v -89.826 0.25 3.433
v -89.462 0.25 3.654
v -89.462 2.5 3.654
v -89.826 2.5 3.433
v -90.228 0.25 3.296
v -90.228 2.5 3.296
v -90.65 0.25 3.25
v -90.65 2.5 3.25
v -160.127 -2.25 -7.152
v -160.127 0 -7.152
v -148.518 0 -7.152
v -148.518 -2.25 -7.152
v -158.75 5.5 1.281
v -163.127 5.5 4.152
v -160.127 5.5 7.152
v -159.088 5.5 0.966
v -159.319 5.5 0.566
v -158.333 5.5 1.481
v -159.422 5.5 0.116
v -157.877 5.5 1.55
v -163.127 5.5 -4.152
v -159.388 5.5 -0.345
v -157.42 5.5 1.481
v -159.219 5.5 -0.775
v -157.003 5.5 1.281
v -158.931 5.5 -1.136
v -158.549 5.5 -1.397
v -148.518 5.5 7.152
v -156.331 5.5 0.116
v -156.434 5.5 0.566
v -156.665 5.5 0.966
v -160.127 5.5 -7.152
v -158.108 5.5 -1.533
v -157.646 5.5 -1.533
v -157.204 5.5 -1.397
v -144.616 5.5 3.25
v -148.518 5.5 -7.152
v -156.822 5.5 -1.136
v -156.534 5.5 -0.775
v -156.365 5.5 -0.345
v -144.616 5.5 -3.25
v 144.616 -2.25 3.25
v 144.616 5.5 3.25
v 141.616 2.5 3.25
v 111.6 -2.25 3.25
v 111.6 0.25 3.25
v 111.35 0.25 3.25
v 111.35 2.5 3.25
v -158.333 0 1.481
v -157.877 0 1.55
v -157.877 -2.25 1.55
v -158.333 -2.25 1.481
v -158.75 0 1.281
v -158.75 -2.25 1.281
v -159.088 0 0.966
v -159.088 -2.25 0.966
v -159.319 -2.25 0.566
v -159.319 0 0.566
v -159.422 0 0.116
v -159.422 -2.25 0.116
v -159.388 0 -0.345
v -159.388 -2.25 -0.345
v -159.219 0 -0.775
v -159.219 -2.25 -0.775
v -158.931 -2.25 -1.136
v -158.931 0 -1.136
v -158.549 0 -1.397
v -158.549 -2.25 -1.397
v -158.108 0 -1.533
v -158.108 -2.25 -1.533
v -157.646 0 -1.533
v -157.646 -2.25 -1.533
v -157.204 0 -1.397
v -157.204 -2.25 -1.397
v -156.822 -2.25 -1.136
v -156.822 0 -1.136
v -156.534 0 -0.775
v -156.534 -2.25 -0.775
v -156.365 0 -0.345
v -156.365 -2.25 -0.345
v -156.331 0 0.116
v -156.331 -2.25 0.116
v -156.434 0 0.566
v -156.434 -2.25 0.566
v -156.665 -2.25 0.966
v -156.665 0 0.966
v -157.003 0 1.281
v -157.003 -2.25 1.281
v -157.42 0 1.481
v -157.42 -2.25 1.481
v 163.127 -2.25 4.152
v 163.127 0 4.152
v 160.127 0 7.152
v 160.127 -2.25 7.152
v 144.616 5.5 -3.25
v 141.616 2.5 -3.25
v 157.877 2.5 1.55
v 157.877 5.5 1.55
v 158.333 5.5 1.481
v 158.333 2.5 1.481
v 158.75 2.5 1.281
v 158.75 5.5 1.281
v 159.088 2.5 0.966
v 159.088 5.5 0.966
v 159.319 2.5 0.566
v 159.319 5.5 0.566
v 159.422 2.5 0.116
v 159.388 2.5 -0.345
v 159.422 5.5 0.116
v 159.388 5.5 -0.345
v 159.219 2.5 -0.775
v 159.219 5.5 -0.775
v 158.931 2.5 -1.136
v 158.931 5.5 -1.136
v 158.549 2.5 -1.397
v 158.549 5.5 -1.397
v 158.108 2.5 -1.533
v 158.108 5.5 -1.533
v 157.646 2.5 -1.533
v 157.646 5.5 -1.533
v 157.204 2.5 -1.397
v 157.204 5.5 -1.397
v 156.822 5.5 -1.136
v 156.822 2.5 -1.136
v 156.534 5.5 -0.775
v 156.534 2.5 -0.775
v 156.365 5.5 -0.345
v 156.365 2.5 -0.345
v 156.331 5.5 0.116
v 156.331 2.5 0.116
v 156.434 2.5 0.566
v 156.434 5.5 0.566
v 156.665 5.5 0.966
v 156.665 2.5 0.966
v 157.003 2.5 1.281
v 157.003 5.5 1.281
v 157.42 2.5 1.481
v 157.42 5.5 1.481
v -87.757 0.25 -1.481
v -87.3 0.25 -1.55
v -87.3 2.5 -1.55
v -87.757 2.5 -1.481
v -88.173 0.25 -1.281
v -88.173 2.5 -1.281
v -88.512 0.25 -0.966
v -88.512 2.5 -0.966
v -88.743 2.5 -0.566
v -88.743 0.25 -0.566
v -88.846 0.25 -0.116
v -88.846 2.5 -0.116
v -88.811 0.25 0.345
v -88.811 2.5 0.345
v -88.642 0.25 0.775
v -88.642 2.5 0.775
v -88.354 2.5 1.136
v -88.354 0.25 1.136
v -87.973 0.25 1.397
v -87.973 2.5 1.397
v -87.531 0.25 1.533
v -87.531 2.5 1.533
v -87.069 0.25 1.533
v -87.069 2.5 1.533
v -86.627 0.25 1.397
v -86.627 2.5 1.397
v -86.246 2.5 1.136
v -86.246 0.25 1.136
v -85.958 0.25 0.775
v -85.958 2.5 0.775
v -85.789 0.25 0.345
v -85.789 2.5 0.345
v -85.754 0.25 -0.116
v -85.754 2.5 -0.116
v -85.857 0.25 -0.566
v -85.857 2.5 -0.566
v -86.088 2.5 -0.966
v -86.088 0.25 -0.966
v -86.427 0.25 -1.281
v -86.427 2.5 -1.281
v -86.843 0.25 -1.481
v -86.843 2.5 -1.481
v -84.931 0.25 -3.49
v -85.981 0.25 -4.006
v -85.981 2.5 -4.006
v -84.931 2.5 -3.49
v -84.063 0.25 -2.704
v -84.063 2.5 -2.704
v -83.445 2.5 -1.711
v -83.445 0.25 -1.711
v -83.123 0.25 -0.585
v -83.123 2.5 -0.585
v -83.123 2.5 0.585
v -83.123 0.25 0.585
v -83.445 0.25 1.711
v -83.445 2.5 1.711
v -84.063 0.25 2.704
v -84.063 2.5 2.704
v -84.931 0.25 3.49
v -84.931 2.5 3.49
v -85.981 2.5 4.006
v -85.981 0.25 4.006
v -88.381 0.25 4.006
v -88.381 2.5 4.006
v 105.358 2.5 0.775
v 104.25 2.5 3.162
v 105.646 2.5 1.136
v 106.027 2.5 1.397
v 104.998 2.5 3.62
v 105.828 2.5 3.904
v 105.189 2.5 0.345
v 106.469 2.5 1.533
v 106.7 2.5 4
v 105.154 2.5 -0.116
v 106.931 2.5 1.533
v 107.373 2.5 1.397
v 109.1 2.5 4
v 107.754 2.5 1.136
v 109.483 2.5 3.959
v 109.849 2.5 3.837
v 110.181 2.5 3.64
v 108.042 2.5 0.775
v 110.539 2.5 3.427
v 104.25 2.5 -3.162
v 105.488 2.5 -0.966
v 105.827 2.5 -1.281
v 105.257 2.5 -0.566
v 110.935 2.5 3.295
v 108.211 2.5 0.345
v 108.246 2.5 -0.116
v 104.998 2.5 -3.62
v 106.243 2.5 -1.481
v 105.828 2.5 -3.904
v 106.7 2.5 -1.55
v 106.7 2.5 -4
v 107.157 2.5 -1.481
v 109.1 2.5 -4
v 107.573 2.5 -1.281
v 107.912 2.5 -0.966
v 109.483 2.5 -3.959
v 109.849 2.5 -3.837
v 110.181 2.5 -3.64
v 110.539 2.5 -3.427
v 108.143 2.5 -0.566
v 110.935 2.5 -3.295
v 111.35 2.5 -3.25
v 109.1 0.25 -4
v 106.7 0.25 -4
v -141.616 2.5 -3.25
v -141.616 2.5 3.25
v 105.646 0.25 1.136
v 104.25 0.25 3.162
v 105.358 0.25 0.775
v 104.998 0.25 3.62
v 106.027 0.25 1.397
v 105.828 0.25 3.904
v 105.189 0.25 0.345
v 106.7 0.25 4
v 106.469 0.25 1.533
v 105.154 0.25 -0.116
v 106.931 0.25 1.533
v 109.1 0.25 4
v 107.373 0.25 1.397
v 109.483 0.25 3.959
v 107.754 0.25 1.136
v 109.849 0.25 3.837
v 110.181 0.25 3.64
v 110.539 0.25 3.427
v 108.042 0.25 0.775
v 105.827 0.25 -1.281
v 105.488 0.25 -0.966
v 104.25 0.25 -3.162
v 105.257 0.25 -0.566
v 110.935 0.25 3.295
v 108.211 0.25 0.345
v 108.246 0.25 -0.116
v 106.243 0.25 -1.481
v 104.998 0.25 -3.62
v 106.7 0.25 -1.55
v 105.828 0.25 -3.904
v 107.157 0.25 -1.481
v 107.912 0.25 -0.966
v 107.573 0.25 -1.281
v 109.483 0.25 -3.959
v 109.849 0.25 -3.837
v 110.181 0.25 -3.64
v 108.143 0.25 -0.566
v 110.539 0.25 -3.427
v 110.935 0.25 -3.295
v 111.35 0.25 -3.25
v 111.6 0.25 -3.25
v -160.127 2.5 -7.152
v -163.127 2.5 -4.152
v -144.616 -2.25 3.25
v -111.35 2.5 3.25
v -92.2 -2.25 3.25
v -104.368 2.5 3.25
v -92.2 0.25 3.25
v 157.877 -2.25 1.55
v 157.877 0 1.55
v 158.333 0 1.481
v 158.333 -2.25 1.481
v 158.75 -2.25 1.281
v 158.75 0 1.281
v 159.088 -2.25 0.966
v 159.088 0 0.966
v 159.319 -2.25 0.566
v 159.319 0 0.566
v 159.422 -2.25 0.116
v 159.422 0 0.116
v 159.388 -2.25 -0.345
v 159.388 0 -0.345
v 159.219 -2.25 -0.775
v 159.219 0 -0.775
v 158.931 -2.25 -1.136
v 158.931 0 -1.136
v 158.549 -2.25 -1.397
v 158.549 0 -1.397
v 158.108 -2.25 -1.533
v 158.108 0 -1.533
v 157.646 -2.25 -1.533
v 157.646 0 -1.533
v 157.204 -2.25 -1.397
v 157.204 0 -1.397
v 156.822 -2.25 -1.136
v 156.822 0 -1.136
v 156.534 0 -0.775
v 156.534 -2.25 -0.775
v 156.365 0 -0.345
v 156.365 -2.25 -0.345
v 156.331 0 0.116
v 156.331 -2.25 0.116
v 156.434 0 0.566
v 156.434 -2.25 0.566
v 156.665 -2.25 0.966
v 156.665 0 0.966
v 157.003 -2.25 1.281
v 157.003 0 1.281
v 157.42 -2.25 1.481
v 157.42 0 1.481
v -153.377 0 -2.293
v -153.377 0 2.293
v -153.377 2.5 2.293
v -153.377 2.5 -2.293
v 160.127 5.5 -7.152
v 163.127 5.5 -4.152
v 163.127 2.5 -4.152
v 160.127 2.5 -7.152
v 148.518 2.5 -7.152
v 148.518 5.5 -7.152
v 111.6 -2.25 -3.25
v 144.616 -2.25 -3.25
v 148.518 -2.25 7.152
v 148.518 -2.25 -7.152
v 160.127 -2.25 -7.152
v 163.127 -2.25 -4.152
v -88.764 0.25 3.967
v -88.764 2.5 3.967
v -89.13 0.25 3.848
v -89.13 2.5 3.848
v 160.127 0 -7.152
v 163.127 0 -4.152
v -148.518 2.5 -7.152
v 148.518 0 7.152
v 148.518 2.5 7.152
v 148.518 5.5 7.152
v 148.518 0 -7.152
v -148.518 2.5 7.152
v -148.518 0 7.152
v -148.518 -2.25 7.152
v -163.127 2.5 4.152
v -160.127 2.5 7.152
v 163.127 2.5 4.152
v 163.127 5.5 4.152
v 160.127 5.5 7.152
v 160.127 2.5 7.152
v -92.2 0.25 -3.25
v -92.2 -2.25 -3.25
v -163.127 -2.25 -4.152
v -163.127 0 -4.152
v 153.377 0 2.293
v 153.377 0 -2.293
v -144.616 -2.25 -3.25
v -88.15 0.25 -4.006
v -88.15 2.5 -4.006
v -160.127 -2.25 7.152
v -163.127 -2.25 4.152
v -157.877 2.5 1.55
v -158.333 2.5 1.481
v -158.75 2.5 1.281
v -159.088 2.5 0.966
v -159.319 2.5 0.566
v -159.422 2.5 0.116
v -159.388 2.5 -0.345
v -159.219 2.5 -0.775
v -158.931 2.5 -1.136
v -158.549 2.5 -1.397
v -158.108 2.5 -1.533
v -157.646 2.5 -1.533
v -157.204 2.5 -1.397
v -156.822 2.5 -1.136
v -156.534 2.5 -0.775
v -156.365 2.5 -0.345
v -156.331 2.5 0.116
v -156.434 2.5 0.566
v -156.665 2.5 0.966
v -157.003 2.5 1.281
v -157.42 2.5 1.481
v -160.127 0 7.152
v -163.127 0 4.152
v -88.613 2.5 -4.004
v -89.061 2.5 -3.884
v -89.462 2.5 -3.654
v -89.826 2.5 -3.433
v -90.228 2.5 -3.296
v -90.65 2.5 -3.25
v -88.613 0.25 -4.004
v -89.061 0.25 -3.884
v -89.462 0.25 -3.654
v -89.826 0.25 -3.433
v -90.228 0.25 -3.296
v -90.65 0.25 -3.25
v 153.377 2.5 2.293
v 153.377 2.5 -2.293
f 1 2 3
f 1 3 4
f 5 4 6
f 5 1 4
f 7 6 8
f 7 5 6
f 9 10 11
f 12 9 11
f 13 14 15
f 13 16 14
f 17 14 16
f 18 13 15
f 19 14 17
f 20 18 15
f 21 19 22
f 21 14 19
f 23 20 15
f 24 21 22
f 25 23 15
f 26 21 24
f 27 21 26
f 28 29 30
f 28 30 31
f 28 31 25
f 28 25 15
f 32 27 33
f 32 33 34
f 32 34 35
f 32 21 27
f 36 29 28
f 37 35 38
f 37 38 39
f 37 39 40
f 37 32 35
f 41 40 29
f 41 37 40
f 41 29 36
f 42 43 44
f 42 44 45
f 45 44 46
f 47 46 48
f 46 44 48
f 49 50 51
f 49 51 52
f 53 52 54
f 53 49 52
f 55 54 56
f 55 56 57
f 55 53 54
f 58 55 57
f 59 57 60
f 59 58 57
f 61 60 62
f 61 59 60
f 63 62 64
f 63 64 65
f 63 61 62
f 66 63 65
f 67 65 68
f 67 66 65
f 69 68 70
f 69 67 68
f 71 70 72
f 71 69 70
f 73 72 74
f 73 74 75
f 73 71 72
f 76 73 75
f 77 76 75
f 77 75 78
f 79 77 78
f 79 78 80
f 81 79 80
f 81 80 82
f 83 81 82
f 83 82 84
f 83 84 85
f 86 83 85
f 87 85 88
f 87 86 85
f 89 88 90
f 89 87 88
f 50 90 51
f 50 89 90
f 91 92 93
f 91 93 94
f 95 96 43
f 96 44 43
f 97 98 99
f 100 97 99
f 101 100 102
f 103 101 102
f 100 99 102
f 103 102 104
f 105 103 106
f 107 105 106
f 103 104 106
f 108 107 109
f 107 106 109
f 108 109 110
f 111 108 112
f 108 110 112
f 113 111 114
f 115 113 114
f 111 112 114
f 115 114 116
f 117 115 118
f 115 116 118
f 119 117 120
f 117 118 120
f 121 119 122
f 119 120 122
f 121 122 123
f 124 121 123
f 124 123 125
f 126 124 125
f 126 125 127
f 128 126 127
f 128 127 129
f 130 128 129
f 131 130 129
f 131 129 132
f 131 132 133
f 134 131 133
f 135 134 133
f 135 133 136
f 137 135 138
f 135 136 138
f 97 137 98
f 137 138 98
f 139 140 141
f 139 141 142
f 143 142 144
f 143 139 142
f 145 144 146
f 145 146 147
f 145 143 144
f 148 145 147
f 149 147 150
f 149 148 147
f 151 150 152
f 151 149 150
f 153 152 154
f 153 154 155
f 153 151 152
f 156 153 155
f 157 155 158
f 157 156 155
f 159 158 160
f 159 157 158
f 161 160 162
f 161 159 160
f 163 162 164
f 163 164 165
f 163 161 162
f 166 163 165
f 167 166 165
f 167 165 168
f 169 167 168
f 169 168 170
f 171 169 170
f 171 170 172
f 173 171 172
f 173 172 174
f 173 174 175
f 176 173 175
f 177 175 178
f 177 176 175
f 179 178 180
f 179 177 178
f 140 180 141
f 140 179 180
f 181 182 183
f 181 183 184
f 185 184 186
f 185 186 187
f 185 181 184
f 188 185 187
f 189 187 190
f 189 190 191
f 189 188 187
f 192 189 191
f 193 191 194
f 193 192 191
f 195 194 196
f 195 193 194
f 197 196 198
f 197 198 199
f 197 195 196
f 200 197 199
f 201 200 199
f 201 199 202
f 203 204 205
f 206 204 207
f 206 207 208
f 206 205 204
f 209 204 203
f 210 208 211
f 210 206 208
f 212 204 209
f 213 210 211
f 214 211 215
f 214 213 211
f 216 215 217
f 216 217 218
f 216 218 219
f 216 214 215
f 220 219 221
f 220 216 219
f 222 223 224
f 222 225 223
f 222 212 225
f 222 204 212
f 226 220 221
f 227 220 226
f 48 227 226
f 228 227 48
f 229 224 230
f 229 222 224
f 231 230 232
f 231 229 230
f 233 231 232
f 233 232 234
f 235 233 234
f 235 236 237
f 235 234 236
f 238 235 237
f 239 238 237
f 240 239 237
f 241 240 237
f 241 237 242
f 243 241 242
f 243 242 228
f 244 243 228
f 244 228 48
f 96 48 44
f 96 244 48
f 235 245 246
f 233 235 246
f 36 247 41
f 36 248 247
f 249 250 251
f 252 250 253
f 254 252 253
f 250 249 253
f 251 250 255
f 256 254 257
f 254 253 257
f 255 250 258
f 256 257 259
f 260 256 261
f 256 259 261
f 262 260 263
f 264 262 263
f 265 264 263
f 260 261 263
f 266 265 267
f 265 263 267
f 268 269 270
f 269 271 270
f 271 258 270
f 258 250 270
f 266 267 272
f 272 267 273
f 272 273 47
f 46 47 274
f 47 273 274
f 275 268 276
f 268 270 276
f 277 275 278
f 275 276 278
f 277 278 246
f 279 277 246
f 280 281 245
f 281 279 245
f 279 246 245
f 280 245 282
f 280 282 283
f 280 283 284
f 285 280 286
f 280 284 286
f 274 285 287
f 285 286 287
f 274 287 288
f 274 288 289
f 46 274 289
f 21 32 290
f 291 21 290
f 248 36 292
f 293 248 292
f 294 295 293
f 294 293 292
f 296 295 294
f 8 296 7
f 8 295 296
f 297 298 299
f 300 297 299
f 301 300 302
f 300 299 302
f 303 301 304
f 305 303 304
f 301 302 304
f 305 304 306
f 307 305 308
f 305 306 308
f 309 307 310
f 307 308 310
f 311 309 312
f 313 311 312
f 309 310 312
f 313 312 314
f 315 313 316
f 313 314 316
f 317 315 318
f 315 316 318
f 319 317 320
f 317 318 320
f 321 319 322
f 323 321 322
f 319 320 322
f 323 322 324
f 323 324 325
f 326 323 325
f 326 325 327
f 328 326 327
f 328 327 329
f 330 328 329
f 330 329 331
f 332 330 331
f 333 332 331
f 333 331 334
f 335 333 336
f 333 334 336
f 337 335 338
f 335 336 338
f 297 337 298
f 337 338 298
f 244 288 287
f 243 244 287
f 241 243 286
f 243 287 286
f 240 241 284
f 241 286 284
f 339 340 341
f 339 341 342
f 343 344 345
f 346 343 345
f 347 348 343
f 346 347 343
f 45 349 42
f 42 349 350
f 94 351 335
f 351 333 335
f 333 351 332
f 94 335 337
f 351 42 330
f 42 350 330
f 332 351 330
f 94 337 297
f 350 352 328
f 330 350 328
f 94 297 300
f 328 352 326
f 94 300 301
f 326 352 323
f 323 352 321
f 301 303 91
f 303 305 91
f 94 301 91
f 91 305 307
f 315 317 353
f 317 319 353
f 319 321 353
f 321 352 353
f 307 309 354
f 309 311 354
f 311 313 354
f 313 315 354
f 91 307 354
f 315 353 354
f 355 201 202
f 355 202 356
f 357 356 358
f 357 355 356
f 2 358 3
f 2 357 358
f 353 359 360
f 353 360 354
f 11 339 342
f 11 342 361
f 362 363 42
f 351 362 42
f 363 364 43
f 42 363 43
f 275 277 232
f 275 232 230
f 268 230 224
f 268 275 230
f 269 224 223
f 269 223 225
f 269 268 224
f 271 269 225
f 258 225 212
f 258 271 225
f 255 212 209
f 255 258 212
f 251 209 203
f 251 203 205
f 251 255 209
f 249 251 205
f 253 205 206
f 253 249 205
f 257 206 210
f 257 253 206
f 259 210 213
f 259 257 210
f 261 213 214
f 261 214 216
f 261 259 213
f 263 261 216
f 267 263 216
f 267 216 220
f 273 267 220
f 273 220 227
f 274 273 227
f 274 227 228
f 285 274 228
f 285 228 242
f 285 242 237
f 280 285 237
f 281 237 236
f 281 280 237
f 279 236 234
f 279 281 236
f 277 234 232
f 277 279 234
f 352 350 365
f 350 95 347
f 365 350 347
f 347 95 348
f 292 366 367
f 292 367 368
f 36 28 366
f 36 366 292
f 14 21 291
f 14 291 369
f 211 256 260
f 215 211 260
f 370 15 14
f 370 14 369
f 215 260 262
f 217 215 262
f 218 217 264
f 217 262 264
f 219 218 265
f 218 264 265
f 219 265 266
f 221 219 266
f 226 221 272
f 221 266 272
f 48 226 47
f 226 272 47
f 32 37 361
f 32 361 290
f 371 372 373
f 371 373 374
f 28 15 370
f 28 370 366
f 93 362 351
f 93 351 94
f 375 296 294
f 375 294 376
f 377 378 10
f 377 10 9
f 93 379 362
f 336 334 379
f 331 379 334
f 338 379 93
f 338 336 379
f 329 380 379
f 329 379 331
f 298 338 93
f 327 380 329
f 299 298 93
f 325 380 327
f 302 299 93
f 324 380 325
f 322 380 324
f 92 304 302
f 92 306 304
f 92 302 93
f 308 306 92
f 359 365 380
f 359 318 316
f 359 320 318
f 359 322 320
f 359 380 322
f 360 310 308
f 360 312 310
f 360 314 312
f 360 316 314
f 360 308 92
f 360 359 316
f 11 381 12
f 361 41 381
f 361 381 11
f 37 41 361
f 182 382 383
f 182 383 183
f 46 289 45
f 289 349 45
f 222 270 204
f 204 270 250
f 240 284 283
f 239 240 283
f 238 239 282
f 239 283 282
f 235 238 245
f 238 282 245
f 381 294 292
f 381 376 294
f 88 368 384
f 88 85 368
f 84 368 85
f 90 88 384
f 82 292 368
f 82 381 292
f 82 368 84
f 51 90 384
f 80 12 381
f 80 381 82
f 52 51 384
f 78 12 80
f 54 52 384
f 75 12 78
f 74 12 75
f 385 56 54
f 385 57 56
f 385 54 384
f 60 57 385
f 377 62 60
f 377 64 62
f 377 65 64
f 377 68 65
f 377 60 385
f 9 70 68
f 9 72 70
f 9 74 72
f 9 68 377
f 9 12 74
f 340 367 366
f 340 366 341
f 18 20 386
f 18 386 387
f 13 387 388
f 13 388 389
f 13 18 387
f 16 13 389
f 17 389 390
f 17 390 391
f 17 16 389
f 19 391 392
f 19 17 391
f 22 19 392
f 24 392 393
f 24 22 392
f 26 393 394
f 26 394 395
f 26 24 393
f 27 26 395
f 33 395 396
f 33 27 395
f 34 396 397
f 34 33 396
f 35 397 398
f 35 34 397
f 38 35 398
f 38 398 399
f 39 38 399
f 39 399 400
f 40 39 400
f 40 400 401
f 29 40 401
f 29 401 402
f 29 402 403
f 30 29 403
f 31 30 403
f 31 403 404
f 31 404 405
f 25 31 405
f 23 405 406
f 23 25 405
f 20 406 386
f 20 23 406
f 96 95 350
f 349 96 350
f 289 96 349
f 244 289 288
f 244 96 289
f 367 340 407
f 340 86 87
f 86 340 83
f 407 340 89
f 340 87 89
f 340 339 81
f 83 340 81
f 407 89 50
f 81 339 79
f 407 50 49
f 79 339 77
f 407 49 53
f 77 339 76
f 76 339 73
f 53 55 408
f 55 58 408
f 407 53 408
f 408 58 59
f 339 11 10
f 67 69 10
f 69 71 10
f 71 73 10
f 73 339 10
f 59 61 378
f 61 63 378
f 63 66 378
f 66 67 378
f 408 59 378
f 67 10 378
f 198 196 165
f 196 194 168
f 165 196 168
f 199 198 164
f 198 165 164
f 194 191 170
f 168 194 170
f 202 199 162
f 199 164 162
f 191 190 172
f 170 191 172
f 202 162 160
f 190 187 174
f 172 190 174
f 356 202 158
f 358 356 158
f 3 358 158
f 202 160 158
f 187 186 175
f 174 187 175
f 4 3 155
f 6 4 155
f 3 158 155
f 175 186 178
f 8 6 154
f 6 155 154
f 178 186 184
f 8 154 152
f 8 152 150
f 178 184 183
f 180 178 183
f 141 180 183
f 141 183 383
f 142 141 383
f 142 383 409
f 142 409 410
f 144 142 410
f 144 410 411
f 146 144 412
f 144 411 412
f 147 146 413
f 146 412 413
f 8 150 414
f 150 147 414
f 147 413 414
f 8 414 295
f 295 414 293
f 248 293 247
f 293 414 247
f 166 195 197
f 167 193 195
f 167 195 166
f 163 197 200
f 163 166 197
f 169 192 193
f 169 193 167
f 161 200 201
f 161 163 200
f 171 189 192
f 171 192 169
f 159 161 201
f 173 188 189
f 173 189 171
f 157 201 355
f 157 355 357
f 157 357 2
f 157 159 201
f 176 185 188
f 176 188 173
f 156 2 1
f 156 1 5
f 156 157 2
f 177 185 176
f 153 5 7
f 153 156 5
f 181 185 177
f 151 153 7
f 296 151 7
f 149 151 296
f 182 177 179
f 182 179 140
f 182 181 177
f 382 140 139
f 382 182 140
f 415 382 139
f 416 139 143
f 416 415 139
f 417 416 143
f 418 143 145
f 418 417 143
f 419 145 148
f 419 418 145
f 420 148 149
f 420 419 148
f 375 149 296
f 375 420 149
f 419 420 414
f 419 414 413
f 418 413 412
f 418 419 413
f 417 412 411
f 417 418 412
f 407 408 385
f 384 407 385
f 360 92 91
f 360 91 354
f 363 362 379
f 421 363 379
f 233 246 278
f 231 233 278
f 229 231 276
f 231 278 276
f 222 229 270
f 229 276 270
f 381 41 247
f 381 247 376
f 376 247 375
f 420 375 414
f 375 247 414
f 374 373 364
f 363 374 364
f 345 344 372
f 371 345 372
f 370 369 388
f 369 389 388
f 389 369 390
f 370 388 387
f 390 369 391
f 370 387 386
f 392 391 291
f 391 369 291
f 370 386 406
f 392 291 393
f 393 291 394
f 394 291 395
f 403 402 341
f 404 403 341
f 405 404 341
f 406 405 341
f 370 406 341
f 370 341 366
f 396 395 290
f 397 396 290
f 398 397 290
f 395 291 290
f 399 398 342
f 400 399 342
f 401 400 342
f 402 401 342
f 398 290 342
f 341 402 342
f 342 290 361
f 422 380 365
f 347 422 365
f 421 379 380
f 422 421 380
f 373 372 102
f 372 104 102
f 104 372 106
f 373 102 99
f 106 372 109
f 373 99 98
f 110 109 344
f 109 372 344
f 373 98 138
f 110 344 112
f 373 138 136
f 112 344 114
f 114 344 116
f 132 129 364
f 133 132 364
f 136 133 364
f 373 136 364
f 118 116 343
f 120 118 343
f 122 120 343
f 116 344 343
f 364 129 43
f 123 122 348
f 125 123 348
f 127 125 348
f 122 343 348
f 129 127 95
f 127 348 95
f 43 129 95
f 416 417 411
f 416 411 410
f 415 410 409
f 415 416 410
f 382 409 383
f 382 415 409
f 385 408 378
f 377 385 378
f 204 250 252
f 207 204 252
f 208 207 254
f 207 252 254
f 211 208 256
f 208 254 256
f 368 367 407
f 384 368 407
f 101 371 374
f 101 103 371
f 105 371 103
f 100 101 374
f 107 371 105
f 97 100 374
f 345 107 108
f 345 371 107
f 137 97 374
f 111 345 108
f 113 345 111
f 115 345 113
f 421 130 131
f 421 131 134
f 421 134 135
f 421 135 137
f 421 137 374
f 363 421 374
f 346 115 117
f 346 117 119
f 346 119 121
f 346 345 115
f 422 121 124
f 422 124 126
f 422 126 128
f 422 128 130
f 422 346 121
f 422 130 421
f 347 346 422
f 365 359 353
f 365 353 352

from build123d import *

# Parameters (mm, degrees)
SKETCH_577_R                   = 1.55
EXTRUDE_1486_DEPTH             = 2.25
EXTRUDE_1550_DEPTH             = 0.25
EXTRUDE_START                  = 0.25
SKETCH_3_R                     = 1.55
EXTRUDE_1865_DEPTH             = 2.25
EXTRUDE_START_2                = 5.5
SKETCH_5_R                     = 1.55
EXTRUDE_4_DEPTH                = 3
CHAMFER_1_SIZE                 = 3
CHAMFER_2_SIZE                 = 3
SKETCH_6_W                     = 8.98980632
SKETCH_6_H                     = 4.173657757
CUT_EXTRUDE_3129_DEPTH         = 164.375923072
SKETCH_4_2_W                   = 20.7
SKETCH_4_2_H                   = 6.5
SKETCH_4_2_R                   = 1.55
EXTRUDE_4092_DEPTH             = 2.25
EXTRUDE_4420_REACH             = 165.376
SKETCH_7_W                     = 19.4
SKETCH_7_H                     = 6.5
EXTRUDE_4420_DIRECTION_2_REACH = 165.376


with BuildPart() as part:
    # Sketch 577 → Extrude 1486 (new body)
    with BuildSketch(Plane(origin=(0, 0, 0), x_dir=(1, 0, 0), z_dir=(0, 1, 0))):
        Polygon((144.615729025, 3.25), (111.6, 3.25), (111.6, -3.25), (144.615729025, -3.25), (148.517618913, -7.151889887), (163.12661558, -7.151889887), (163.12661558, 7.151889887), (148.517618913, 7.151889887), align=None)
        with Locations(Location((157.87661558, 0, 0), (0, 0, 270))):
            Circle(SKETCH_577_R, mode=Mode.SUBTRACT)
    extrude(amount=-EXTRUDE_1486_DEPTH)

    # Sketch 4 → Extrude 1550 (add)
    with BuildSketch(Plane(origin=(0, 0, 0), x_dir=(1, 0, 0), z_dir=(0, 1, 0))):
        Polygon((144.615729025, 3.25), (111.6, 3.25), (111.6, -3.25), (144.615729025, -3.25), (148.517618913, -7.151889887), (153.376615581, -2.292893219), (153.376615581, 2.292893219), (148.517618913, 7.151889887), align=None)
    extrude(amount=EXTRUDE_1550_DEPTH)

    # 主结构-草图<3> → Extrude 1865 (add)
    with BuildSketch(Plane(origin=(0, 0, 0), x_dir=(1, 0, 0), z_dir=(0, 1, 0)).offset(EXTRUDE_START)):
        with BuildLine():
            ThreePointArc((111.35, 3.25), (110.733713943, 3.350009459), (110.180679422, 3.639773526))
            ThreePointArc((110.180679422, 3.639773526), (109.669568065, 3.907571827), (109.1, 4))
            Line((109.1, 4), (106.7, 4))
            ThreePointArc((106.7, 4), (105.40530494, 3.78467498), (104.25, 3.161882351))
            Line((104.25, 3.161882351), (104.25, -3.161882351))
            ThreePointArc((104.25, -3.161882351), (105.40530494, -3.78467498), (106.7, -4))
            Line((106.7, -4), (109.1, -4))
            ThreePointArc((109.1, -4), (109.669568065, -3.907571827), (110.180679422, -3.639773526))
            ThreePointArc((110.180679422, -3.639773526), (110.733713943, -3.350009459), (111.35, -3.25))
            Line((111.35, -3.25), (144.615729025, -3.25))
            Line((144.615729025, -3.25), (148.517618913, -7.151889887))
            Line((148.517618913, -7.151889887), (153.376615581, -2.292893219))
            Line((153.376615581, -2.292893219), (153.376615581, 2.292893219))
            Line((153.376615581, 2.292893219), (148.517618913, 7.151889887))
            Line((148.517618913, 7.151889887), (144.615729025, 3.25))
            Line((144.615729025, 3.25), (111.35, 3.25))
        make_face()
        with Locations(Location((106.7, 0, 0), (0, 0, 90))):
            Circle(SKETCH_3_R, mode=Mode.SUBTRACT)
    extrude(amount=EXTRUDE_1865_DEPTH)

    # 主结构-草图<5> → 凸台-拉伸4 (add)
    # profile 1 of 2: a face of its own
    with BuildSketch(Plane(origin=(0, 0, 0), x_dir=(1, 0, 0), z_dir=(0, 1, 0)).offset(EXTRUDE_START_2)):
        Polygon((144.615729025, 3.25), (148.517618913, 7.151889887), (153.376615581, 2.292893219), (153.376615581, -2.292893219), (148.517618913, -7.151889887), (144.615729025, -3.25), align=None)
    # profile 2 of 2: a face of its own
    with BuildSketch(Plane(origin=(0, 0, 0), x_dir=(1, 0, 0), z_dir=(0, 1, 0)).offset(EXTRUDE_START_2)):
        Polygon((163.12661558, -7.151889887), (148.517618913, -7.151889887), (153.376615581, -2.292893219), (153.376615581, 2.292893219), (148.517618913, 7.151889887), (163.12661558, 7.151889887), align=None)
        with Locations(Location((157.87661558, 0, 0), (0, 0, 270))):
            Circle(SKETCH_5_R, mode=Mode.SUBTRACT)
    extrude(amount=-EXTRUDE_4_DEPTH)

    # 倒角1
    # the kernel refuses this chamfer: 3 mm, written as the material it adds along each edge
    with BuildSketch(Plane(origin=(144.615729025, 2.5, 3.25), x_dir=(-0.9996219169112968, -0.027495876610586462, 0), z_dir=(0, 0, -1))) as chamfer_1_piece_1_section:
        Polygon((CHAMFER_1_SIZE * 0.999621916911, CHAMFER_1_SIZE * 0.0274958766106), (-CHAMFER_1_SIZE * 0.0274958766106, CHAMFER_1_SIZE * 0.999621916911), (0, 0), align=None)
    chamfer_1_piece_1 = extrude(amount=6.5, mode=Mode.PRIVATE)
    chamfer_1_piece_1 = split(chamfer_1_piece_1, bisect_by=Plane(origin=(143.442838303, 3.183373084, 2.077109278), z_dir=(-0.7071067811865577, 0, 0.7071067811865375)), keep=Keep.TOP, mode=Mode.PRIVATE)
    add(chamfer_1_piece_1)
    with BuildSketch(Plane(origin=(144.615729025, 2.5, 3.25), x_dir=(-0.9996219169112968, -0.027495876610586462, 0), z_dir=(0, 0, -1))) as chamfer_1_piece_2_section:
        Polygon((CHAMFER_1_SIZE * 0.999621916911, CHAMFER_1_SIZE * 0.0274958766106), (-CHAMFER_1_SIZE * 0.0274958766106, CHAMFER_1_SIZE * 0.999621916911), (0, 0), align=None)
    chamfer_1_piece_2 = extrude(amount=6.5, mode=Mode.PRIVATE)
    chamfer_1_piece_2 = split(chamfer_1_piece_2, bisect_by=Plane(origin=(142.621093837, 3.61900543, -1.255364812), z_dir=(0.7071067811865474, 0, 0.7071067811865477)), keep=Keep.TOP, mode=Mode.PRIVATE)
    chamfer_1_piece_2 = split(chamfer_1_piece_2, bisect_by=Plane(origin=(142.621093837, 3.61900543, 1.255364812), z_dir=(0.7071067811865577, 0, -0.7071067811865375)), keep=Keep.TOP, mode=Mode.PRIVATE)
    chamfer_1_piece_2 = split(chamfer_1_piece_2, bisect_by=Plane(origin=(143.876458648, 5.5, 0), z_dir=(0, -1, 0)), keep=Keep.TOP, mode=Mode.PRIVATE)
    add(chamfer_1_piece_2)
    with BuildSketch(Plane(origin=(144.615729025, 2.5, 3.25), x_dir=(-0.9996219169112968, -0.027495876610586462, 0), z_dir=(0, 0, -1))) as chamfer_1_piece_3_section:
        Polygon((CHAMFER_1_SIZE * 0.999621916911, CHAMFER_1_SIZE * 0.0274958766106), (-CHAMFER_1_SIZE * 0.0274958766106, CHAMFER_1_SIZE * 0.999621916911), (0, 0), align=None)
    chamfer_1_piece_3 = extrude(amount=6.5, mode=Mode.PRIVATE)
    chamfer_1_piece_3 = split(chamfer_1_piece_3, bisect_by=Plane(origin=(143.442838303, 3.183373084, -2.077109278), z_dir=(-0.7071067811865474, 0, -0.7071067811865477)), keep=Keep.TOP, mode=Mode.PRIVATE)
    add(chamfer_1_piece_3)

    # 倒角2
    chamfer_2_edges = [part.edges().sort_by_distance(p)[0] for p in [
        (163.12661558, -1.125, -7.151889887),
        (163.12661558, -1.125, 7.151889887),
        (163.12661558, 4, 7.151889887),
        (163.12661558, 4, -7.151889887),
    ]]
    chamfer(chamfer_2_edges, length=CHAMFER_2_SIZE)


with BuildPart() as body_2:
    # 镜向1: mirrored copy
    add(part.part.mirror(Plane(origin=(0, 0, 0), x_dir=(0, 0, 1), z_dir=(1, 0, 0))))

    # 草图6 → Cut-Extrude 3129 (cut, through all)
    with BuildSketch(Plane(origin=(0, 0, 0), x_dir=(1, 0, 0), z_dir=(0, 1, 0))):
        with Locations((-106.85509684, 5.336828879)):
            Rectangle(SKETCH_6_W, SKETCH_6_H)
        with Locations((-106.85509684, -5.336828879)):
            Rectangle(SKETCH_6_W, SKETCH_6_H)
    extrude(amount=CUT_EXTRUDE_3129_DEPTH, mode=Mode.SUBTRACT)

    # Sketch 4 2 → Extrude 4092 (add)
    # profile 1 of 2: a face of its own
    with BuildSketch(Plane(origin=(0, 0, 0), x_dir=(1, 0, 0), z_dir=(0, 1, 0)).offset(EXTRUDE_START)):
        with Locations((-101, 0)):
            Rectangle(SKETCH_4_2_W, SKETCH_4_2_H)
    # profile 2 of 2: a face of its own
    with BuildSketch(Plane(origin=(0, 0, 0), x_dir=(1, 0, 0), z_dir=(0, 1, 0)).offset(EXTRUDE_START)):
        with BuildLine():
            ThreePointArc((-85.981337923, 4.006159445), (-83.082396039, 0), (-85.981337923, -4.006159445))
            Line((-85.981337923, -4.006159445), (-88.381337923, -4.006159445))
            ThreePointArc((-88.381337923, -4.006159445), (-88.950452521, -3.917442693), (-89.462460405, -3.653605597))
            ThreePointArc((-89.462460405, -3.653605597), (-90.022874062, -3.35365813), (-90.65, -3.25))
            Line((-90.65, -3.25), (-90.65, 3.25))
            ThreePointArc((-90.65, 3.25), (-90.022874062, 3.35365813), (-89.462460405, 3.653605597))
            ThreePointArc((-89.462460405, 3.653605597), (-88.84075687, 3.95841575), (-88.15, 4.006159445))
            Line((-88.15, 4.006159445), (-85.981337923, 4.006159445))
        make_face()
        with Locations(Location((-87.3, 0, 0), (0, 0, 90))):
            Circle(SKETCH_4_2_R, mode=Mode.SUBTRACT)
    extrude(amount=EXTRUDE_4092_DEPTH)

    # 草图7 → Extrude 4420 (add, up to next)
    with BuildSketch(Plane(origin=(0, 0, 0), x_dir=(1, 0, 0), z_dir=(0, 1, 0)), mode=Mode.PRIVATE) as extrude_4420_sk1:
        with Locations((-101.9, 0)):
            Rectangle(SKETCH_7_W, SKETCH_7_H)
    extrude_4420_tool1 = extrude(extrude_4420_sk1.sketch, amount=EXTRUDE_4420_REACH, mode=Mode.PRIVATE) - body_2.part
    add(extrude_4420_tool1.solids().sort_by_distance((-101.9, 0, 0))[0])

    # Extrude 4420 direction 2: up to this face of the body (flat: up to its plane)
    extrude_4420_direction_2_end = Plane(body_2.part.faces().sort_by_distance((-141.556120838, -2.25, 0))[0])
    # 草图7 → Extrude 4420 direction 2 (add, up to the picked face)
    with BuildSketch(Plane(origin=(0, 0, 0), x_dir=(1, 0, 0), z_dir=(0, 1, 0)), mode=Mode.PRIVATE) as extrude_4420_direction_2_sk1:
        with Locations((-101.9, 0)):
            Rectangle(SKETCH_7_W, SKETCH_7_H)
    extrude_4420_direction_2_tool1 = split(extrude(extrude_4420_direction_2_sk1.sketch, amount=-EXTRUDE_4420_DIRECTION_2_REACH, mode=Mode.PRIVATE), bisect_by=extrude_4420_direction_2_end, keep=Keep.BOTH, mode=Mode.PRIVATE)
    add(extrude_4420_direction_2_tool1.solids().sort_by(Axis((-101.9, 0, 0), (0, -1, 0)))[0])


solid = Compound([part.part, body_2.part])
